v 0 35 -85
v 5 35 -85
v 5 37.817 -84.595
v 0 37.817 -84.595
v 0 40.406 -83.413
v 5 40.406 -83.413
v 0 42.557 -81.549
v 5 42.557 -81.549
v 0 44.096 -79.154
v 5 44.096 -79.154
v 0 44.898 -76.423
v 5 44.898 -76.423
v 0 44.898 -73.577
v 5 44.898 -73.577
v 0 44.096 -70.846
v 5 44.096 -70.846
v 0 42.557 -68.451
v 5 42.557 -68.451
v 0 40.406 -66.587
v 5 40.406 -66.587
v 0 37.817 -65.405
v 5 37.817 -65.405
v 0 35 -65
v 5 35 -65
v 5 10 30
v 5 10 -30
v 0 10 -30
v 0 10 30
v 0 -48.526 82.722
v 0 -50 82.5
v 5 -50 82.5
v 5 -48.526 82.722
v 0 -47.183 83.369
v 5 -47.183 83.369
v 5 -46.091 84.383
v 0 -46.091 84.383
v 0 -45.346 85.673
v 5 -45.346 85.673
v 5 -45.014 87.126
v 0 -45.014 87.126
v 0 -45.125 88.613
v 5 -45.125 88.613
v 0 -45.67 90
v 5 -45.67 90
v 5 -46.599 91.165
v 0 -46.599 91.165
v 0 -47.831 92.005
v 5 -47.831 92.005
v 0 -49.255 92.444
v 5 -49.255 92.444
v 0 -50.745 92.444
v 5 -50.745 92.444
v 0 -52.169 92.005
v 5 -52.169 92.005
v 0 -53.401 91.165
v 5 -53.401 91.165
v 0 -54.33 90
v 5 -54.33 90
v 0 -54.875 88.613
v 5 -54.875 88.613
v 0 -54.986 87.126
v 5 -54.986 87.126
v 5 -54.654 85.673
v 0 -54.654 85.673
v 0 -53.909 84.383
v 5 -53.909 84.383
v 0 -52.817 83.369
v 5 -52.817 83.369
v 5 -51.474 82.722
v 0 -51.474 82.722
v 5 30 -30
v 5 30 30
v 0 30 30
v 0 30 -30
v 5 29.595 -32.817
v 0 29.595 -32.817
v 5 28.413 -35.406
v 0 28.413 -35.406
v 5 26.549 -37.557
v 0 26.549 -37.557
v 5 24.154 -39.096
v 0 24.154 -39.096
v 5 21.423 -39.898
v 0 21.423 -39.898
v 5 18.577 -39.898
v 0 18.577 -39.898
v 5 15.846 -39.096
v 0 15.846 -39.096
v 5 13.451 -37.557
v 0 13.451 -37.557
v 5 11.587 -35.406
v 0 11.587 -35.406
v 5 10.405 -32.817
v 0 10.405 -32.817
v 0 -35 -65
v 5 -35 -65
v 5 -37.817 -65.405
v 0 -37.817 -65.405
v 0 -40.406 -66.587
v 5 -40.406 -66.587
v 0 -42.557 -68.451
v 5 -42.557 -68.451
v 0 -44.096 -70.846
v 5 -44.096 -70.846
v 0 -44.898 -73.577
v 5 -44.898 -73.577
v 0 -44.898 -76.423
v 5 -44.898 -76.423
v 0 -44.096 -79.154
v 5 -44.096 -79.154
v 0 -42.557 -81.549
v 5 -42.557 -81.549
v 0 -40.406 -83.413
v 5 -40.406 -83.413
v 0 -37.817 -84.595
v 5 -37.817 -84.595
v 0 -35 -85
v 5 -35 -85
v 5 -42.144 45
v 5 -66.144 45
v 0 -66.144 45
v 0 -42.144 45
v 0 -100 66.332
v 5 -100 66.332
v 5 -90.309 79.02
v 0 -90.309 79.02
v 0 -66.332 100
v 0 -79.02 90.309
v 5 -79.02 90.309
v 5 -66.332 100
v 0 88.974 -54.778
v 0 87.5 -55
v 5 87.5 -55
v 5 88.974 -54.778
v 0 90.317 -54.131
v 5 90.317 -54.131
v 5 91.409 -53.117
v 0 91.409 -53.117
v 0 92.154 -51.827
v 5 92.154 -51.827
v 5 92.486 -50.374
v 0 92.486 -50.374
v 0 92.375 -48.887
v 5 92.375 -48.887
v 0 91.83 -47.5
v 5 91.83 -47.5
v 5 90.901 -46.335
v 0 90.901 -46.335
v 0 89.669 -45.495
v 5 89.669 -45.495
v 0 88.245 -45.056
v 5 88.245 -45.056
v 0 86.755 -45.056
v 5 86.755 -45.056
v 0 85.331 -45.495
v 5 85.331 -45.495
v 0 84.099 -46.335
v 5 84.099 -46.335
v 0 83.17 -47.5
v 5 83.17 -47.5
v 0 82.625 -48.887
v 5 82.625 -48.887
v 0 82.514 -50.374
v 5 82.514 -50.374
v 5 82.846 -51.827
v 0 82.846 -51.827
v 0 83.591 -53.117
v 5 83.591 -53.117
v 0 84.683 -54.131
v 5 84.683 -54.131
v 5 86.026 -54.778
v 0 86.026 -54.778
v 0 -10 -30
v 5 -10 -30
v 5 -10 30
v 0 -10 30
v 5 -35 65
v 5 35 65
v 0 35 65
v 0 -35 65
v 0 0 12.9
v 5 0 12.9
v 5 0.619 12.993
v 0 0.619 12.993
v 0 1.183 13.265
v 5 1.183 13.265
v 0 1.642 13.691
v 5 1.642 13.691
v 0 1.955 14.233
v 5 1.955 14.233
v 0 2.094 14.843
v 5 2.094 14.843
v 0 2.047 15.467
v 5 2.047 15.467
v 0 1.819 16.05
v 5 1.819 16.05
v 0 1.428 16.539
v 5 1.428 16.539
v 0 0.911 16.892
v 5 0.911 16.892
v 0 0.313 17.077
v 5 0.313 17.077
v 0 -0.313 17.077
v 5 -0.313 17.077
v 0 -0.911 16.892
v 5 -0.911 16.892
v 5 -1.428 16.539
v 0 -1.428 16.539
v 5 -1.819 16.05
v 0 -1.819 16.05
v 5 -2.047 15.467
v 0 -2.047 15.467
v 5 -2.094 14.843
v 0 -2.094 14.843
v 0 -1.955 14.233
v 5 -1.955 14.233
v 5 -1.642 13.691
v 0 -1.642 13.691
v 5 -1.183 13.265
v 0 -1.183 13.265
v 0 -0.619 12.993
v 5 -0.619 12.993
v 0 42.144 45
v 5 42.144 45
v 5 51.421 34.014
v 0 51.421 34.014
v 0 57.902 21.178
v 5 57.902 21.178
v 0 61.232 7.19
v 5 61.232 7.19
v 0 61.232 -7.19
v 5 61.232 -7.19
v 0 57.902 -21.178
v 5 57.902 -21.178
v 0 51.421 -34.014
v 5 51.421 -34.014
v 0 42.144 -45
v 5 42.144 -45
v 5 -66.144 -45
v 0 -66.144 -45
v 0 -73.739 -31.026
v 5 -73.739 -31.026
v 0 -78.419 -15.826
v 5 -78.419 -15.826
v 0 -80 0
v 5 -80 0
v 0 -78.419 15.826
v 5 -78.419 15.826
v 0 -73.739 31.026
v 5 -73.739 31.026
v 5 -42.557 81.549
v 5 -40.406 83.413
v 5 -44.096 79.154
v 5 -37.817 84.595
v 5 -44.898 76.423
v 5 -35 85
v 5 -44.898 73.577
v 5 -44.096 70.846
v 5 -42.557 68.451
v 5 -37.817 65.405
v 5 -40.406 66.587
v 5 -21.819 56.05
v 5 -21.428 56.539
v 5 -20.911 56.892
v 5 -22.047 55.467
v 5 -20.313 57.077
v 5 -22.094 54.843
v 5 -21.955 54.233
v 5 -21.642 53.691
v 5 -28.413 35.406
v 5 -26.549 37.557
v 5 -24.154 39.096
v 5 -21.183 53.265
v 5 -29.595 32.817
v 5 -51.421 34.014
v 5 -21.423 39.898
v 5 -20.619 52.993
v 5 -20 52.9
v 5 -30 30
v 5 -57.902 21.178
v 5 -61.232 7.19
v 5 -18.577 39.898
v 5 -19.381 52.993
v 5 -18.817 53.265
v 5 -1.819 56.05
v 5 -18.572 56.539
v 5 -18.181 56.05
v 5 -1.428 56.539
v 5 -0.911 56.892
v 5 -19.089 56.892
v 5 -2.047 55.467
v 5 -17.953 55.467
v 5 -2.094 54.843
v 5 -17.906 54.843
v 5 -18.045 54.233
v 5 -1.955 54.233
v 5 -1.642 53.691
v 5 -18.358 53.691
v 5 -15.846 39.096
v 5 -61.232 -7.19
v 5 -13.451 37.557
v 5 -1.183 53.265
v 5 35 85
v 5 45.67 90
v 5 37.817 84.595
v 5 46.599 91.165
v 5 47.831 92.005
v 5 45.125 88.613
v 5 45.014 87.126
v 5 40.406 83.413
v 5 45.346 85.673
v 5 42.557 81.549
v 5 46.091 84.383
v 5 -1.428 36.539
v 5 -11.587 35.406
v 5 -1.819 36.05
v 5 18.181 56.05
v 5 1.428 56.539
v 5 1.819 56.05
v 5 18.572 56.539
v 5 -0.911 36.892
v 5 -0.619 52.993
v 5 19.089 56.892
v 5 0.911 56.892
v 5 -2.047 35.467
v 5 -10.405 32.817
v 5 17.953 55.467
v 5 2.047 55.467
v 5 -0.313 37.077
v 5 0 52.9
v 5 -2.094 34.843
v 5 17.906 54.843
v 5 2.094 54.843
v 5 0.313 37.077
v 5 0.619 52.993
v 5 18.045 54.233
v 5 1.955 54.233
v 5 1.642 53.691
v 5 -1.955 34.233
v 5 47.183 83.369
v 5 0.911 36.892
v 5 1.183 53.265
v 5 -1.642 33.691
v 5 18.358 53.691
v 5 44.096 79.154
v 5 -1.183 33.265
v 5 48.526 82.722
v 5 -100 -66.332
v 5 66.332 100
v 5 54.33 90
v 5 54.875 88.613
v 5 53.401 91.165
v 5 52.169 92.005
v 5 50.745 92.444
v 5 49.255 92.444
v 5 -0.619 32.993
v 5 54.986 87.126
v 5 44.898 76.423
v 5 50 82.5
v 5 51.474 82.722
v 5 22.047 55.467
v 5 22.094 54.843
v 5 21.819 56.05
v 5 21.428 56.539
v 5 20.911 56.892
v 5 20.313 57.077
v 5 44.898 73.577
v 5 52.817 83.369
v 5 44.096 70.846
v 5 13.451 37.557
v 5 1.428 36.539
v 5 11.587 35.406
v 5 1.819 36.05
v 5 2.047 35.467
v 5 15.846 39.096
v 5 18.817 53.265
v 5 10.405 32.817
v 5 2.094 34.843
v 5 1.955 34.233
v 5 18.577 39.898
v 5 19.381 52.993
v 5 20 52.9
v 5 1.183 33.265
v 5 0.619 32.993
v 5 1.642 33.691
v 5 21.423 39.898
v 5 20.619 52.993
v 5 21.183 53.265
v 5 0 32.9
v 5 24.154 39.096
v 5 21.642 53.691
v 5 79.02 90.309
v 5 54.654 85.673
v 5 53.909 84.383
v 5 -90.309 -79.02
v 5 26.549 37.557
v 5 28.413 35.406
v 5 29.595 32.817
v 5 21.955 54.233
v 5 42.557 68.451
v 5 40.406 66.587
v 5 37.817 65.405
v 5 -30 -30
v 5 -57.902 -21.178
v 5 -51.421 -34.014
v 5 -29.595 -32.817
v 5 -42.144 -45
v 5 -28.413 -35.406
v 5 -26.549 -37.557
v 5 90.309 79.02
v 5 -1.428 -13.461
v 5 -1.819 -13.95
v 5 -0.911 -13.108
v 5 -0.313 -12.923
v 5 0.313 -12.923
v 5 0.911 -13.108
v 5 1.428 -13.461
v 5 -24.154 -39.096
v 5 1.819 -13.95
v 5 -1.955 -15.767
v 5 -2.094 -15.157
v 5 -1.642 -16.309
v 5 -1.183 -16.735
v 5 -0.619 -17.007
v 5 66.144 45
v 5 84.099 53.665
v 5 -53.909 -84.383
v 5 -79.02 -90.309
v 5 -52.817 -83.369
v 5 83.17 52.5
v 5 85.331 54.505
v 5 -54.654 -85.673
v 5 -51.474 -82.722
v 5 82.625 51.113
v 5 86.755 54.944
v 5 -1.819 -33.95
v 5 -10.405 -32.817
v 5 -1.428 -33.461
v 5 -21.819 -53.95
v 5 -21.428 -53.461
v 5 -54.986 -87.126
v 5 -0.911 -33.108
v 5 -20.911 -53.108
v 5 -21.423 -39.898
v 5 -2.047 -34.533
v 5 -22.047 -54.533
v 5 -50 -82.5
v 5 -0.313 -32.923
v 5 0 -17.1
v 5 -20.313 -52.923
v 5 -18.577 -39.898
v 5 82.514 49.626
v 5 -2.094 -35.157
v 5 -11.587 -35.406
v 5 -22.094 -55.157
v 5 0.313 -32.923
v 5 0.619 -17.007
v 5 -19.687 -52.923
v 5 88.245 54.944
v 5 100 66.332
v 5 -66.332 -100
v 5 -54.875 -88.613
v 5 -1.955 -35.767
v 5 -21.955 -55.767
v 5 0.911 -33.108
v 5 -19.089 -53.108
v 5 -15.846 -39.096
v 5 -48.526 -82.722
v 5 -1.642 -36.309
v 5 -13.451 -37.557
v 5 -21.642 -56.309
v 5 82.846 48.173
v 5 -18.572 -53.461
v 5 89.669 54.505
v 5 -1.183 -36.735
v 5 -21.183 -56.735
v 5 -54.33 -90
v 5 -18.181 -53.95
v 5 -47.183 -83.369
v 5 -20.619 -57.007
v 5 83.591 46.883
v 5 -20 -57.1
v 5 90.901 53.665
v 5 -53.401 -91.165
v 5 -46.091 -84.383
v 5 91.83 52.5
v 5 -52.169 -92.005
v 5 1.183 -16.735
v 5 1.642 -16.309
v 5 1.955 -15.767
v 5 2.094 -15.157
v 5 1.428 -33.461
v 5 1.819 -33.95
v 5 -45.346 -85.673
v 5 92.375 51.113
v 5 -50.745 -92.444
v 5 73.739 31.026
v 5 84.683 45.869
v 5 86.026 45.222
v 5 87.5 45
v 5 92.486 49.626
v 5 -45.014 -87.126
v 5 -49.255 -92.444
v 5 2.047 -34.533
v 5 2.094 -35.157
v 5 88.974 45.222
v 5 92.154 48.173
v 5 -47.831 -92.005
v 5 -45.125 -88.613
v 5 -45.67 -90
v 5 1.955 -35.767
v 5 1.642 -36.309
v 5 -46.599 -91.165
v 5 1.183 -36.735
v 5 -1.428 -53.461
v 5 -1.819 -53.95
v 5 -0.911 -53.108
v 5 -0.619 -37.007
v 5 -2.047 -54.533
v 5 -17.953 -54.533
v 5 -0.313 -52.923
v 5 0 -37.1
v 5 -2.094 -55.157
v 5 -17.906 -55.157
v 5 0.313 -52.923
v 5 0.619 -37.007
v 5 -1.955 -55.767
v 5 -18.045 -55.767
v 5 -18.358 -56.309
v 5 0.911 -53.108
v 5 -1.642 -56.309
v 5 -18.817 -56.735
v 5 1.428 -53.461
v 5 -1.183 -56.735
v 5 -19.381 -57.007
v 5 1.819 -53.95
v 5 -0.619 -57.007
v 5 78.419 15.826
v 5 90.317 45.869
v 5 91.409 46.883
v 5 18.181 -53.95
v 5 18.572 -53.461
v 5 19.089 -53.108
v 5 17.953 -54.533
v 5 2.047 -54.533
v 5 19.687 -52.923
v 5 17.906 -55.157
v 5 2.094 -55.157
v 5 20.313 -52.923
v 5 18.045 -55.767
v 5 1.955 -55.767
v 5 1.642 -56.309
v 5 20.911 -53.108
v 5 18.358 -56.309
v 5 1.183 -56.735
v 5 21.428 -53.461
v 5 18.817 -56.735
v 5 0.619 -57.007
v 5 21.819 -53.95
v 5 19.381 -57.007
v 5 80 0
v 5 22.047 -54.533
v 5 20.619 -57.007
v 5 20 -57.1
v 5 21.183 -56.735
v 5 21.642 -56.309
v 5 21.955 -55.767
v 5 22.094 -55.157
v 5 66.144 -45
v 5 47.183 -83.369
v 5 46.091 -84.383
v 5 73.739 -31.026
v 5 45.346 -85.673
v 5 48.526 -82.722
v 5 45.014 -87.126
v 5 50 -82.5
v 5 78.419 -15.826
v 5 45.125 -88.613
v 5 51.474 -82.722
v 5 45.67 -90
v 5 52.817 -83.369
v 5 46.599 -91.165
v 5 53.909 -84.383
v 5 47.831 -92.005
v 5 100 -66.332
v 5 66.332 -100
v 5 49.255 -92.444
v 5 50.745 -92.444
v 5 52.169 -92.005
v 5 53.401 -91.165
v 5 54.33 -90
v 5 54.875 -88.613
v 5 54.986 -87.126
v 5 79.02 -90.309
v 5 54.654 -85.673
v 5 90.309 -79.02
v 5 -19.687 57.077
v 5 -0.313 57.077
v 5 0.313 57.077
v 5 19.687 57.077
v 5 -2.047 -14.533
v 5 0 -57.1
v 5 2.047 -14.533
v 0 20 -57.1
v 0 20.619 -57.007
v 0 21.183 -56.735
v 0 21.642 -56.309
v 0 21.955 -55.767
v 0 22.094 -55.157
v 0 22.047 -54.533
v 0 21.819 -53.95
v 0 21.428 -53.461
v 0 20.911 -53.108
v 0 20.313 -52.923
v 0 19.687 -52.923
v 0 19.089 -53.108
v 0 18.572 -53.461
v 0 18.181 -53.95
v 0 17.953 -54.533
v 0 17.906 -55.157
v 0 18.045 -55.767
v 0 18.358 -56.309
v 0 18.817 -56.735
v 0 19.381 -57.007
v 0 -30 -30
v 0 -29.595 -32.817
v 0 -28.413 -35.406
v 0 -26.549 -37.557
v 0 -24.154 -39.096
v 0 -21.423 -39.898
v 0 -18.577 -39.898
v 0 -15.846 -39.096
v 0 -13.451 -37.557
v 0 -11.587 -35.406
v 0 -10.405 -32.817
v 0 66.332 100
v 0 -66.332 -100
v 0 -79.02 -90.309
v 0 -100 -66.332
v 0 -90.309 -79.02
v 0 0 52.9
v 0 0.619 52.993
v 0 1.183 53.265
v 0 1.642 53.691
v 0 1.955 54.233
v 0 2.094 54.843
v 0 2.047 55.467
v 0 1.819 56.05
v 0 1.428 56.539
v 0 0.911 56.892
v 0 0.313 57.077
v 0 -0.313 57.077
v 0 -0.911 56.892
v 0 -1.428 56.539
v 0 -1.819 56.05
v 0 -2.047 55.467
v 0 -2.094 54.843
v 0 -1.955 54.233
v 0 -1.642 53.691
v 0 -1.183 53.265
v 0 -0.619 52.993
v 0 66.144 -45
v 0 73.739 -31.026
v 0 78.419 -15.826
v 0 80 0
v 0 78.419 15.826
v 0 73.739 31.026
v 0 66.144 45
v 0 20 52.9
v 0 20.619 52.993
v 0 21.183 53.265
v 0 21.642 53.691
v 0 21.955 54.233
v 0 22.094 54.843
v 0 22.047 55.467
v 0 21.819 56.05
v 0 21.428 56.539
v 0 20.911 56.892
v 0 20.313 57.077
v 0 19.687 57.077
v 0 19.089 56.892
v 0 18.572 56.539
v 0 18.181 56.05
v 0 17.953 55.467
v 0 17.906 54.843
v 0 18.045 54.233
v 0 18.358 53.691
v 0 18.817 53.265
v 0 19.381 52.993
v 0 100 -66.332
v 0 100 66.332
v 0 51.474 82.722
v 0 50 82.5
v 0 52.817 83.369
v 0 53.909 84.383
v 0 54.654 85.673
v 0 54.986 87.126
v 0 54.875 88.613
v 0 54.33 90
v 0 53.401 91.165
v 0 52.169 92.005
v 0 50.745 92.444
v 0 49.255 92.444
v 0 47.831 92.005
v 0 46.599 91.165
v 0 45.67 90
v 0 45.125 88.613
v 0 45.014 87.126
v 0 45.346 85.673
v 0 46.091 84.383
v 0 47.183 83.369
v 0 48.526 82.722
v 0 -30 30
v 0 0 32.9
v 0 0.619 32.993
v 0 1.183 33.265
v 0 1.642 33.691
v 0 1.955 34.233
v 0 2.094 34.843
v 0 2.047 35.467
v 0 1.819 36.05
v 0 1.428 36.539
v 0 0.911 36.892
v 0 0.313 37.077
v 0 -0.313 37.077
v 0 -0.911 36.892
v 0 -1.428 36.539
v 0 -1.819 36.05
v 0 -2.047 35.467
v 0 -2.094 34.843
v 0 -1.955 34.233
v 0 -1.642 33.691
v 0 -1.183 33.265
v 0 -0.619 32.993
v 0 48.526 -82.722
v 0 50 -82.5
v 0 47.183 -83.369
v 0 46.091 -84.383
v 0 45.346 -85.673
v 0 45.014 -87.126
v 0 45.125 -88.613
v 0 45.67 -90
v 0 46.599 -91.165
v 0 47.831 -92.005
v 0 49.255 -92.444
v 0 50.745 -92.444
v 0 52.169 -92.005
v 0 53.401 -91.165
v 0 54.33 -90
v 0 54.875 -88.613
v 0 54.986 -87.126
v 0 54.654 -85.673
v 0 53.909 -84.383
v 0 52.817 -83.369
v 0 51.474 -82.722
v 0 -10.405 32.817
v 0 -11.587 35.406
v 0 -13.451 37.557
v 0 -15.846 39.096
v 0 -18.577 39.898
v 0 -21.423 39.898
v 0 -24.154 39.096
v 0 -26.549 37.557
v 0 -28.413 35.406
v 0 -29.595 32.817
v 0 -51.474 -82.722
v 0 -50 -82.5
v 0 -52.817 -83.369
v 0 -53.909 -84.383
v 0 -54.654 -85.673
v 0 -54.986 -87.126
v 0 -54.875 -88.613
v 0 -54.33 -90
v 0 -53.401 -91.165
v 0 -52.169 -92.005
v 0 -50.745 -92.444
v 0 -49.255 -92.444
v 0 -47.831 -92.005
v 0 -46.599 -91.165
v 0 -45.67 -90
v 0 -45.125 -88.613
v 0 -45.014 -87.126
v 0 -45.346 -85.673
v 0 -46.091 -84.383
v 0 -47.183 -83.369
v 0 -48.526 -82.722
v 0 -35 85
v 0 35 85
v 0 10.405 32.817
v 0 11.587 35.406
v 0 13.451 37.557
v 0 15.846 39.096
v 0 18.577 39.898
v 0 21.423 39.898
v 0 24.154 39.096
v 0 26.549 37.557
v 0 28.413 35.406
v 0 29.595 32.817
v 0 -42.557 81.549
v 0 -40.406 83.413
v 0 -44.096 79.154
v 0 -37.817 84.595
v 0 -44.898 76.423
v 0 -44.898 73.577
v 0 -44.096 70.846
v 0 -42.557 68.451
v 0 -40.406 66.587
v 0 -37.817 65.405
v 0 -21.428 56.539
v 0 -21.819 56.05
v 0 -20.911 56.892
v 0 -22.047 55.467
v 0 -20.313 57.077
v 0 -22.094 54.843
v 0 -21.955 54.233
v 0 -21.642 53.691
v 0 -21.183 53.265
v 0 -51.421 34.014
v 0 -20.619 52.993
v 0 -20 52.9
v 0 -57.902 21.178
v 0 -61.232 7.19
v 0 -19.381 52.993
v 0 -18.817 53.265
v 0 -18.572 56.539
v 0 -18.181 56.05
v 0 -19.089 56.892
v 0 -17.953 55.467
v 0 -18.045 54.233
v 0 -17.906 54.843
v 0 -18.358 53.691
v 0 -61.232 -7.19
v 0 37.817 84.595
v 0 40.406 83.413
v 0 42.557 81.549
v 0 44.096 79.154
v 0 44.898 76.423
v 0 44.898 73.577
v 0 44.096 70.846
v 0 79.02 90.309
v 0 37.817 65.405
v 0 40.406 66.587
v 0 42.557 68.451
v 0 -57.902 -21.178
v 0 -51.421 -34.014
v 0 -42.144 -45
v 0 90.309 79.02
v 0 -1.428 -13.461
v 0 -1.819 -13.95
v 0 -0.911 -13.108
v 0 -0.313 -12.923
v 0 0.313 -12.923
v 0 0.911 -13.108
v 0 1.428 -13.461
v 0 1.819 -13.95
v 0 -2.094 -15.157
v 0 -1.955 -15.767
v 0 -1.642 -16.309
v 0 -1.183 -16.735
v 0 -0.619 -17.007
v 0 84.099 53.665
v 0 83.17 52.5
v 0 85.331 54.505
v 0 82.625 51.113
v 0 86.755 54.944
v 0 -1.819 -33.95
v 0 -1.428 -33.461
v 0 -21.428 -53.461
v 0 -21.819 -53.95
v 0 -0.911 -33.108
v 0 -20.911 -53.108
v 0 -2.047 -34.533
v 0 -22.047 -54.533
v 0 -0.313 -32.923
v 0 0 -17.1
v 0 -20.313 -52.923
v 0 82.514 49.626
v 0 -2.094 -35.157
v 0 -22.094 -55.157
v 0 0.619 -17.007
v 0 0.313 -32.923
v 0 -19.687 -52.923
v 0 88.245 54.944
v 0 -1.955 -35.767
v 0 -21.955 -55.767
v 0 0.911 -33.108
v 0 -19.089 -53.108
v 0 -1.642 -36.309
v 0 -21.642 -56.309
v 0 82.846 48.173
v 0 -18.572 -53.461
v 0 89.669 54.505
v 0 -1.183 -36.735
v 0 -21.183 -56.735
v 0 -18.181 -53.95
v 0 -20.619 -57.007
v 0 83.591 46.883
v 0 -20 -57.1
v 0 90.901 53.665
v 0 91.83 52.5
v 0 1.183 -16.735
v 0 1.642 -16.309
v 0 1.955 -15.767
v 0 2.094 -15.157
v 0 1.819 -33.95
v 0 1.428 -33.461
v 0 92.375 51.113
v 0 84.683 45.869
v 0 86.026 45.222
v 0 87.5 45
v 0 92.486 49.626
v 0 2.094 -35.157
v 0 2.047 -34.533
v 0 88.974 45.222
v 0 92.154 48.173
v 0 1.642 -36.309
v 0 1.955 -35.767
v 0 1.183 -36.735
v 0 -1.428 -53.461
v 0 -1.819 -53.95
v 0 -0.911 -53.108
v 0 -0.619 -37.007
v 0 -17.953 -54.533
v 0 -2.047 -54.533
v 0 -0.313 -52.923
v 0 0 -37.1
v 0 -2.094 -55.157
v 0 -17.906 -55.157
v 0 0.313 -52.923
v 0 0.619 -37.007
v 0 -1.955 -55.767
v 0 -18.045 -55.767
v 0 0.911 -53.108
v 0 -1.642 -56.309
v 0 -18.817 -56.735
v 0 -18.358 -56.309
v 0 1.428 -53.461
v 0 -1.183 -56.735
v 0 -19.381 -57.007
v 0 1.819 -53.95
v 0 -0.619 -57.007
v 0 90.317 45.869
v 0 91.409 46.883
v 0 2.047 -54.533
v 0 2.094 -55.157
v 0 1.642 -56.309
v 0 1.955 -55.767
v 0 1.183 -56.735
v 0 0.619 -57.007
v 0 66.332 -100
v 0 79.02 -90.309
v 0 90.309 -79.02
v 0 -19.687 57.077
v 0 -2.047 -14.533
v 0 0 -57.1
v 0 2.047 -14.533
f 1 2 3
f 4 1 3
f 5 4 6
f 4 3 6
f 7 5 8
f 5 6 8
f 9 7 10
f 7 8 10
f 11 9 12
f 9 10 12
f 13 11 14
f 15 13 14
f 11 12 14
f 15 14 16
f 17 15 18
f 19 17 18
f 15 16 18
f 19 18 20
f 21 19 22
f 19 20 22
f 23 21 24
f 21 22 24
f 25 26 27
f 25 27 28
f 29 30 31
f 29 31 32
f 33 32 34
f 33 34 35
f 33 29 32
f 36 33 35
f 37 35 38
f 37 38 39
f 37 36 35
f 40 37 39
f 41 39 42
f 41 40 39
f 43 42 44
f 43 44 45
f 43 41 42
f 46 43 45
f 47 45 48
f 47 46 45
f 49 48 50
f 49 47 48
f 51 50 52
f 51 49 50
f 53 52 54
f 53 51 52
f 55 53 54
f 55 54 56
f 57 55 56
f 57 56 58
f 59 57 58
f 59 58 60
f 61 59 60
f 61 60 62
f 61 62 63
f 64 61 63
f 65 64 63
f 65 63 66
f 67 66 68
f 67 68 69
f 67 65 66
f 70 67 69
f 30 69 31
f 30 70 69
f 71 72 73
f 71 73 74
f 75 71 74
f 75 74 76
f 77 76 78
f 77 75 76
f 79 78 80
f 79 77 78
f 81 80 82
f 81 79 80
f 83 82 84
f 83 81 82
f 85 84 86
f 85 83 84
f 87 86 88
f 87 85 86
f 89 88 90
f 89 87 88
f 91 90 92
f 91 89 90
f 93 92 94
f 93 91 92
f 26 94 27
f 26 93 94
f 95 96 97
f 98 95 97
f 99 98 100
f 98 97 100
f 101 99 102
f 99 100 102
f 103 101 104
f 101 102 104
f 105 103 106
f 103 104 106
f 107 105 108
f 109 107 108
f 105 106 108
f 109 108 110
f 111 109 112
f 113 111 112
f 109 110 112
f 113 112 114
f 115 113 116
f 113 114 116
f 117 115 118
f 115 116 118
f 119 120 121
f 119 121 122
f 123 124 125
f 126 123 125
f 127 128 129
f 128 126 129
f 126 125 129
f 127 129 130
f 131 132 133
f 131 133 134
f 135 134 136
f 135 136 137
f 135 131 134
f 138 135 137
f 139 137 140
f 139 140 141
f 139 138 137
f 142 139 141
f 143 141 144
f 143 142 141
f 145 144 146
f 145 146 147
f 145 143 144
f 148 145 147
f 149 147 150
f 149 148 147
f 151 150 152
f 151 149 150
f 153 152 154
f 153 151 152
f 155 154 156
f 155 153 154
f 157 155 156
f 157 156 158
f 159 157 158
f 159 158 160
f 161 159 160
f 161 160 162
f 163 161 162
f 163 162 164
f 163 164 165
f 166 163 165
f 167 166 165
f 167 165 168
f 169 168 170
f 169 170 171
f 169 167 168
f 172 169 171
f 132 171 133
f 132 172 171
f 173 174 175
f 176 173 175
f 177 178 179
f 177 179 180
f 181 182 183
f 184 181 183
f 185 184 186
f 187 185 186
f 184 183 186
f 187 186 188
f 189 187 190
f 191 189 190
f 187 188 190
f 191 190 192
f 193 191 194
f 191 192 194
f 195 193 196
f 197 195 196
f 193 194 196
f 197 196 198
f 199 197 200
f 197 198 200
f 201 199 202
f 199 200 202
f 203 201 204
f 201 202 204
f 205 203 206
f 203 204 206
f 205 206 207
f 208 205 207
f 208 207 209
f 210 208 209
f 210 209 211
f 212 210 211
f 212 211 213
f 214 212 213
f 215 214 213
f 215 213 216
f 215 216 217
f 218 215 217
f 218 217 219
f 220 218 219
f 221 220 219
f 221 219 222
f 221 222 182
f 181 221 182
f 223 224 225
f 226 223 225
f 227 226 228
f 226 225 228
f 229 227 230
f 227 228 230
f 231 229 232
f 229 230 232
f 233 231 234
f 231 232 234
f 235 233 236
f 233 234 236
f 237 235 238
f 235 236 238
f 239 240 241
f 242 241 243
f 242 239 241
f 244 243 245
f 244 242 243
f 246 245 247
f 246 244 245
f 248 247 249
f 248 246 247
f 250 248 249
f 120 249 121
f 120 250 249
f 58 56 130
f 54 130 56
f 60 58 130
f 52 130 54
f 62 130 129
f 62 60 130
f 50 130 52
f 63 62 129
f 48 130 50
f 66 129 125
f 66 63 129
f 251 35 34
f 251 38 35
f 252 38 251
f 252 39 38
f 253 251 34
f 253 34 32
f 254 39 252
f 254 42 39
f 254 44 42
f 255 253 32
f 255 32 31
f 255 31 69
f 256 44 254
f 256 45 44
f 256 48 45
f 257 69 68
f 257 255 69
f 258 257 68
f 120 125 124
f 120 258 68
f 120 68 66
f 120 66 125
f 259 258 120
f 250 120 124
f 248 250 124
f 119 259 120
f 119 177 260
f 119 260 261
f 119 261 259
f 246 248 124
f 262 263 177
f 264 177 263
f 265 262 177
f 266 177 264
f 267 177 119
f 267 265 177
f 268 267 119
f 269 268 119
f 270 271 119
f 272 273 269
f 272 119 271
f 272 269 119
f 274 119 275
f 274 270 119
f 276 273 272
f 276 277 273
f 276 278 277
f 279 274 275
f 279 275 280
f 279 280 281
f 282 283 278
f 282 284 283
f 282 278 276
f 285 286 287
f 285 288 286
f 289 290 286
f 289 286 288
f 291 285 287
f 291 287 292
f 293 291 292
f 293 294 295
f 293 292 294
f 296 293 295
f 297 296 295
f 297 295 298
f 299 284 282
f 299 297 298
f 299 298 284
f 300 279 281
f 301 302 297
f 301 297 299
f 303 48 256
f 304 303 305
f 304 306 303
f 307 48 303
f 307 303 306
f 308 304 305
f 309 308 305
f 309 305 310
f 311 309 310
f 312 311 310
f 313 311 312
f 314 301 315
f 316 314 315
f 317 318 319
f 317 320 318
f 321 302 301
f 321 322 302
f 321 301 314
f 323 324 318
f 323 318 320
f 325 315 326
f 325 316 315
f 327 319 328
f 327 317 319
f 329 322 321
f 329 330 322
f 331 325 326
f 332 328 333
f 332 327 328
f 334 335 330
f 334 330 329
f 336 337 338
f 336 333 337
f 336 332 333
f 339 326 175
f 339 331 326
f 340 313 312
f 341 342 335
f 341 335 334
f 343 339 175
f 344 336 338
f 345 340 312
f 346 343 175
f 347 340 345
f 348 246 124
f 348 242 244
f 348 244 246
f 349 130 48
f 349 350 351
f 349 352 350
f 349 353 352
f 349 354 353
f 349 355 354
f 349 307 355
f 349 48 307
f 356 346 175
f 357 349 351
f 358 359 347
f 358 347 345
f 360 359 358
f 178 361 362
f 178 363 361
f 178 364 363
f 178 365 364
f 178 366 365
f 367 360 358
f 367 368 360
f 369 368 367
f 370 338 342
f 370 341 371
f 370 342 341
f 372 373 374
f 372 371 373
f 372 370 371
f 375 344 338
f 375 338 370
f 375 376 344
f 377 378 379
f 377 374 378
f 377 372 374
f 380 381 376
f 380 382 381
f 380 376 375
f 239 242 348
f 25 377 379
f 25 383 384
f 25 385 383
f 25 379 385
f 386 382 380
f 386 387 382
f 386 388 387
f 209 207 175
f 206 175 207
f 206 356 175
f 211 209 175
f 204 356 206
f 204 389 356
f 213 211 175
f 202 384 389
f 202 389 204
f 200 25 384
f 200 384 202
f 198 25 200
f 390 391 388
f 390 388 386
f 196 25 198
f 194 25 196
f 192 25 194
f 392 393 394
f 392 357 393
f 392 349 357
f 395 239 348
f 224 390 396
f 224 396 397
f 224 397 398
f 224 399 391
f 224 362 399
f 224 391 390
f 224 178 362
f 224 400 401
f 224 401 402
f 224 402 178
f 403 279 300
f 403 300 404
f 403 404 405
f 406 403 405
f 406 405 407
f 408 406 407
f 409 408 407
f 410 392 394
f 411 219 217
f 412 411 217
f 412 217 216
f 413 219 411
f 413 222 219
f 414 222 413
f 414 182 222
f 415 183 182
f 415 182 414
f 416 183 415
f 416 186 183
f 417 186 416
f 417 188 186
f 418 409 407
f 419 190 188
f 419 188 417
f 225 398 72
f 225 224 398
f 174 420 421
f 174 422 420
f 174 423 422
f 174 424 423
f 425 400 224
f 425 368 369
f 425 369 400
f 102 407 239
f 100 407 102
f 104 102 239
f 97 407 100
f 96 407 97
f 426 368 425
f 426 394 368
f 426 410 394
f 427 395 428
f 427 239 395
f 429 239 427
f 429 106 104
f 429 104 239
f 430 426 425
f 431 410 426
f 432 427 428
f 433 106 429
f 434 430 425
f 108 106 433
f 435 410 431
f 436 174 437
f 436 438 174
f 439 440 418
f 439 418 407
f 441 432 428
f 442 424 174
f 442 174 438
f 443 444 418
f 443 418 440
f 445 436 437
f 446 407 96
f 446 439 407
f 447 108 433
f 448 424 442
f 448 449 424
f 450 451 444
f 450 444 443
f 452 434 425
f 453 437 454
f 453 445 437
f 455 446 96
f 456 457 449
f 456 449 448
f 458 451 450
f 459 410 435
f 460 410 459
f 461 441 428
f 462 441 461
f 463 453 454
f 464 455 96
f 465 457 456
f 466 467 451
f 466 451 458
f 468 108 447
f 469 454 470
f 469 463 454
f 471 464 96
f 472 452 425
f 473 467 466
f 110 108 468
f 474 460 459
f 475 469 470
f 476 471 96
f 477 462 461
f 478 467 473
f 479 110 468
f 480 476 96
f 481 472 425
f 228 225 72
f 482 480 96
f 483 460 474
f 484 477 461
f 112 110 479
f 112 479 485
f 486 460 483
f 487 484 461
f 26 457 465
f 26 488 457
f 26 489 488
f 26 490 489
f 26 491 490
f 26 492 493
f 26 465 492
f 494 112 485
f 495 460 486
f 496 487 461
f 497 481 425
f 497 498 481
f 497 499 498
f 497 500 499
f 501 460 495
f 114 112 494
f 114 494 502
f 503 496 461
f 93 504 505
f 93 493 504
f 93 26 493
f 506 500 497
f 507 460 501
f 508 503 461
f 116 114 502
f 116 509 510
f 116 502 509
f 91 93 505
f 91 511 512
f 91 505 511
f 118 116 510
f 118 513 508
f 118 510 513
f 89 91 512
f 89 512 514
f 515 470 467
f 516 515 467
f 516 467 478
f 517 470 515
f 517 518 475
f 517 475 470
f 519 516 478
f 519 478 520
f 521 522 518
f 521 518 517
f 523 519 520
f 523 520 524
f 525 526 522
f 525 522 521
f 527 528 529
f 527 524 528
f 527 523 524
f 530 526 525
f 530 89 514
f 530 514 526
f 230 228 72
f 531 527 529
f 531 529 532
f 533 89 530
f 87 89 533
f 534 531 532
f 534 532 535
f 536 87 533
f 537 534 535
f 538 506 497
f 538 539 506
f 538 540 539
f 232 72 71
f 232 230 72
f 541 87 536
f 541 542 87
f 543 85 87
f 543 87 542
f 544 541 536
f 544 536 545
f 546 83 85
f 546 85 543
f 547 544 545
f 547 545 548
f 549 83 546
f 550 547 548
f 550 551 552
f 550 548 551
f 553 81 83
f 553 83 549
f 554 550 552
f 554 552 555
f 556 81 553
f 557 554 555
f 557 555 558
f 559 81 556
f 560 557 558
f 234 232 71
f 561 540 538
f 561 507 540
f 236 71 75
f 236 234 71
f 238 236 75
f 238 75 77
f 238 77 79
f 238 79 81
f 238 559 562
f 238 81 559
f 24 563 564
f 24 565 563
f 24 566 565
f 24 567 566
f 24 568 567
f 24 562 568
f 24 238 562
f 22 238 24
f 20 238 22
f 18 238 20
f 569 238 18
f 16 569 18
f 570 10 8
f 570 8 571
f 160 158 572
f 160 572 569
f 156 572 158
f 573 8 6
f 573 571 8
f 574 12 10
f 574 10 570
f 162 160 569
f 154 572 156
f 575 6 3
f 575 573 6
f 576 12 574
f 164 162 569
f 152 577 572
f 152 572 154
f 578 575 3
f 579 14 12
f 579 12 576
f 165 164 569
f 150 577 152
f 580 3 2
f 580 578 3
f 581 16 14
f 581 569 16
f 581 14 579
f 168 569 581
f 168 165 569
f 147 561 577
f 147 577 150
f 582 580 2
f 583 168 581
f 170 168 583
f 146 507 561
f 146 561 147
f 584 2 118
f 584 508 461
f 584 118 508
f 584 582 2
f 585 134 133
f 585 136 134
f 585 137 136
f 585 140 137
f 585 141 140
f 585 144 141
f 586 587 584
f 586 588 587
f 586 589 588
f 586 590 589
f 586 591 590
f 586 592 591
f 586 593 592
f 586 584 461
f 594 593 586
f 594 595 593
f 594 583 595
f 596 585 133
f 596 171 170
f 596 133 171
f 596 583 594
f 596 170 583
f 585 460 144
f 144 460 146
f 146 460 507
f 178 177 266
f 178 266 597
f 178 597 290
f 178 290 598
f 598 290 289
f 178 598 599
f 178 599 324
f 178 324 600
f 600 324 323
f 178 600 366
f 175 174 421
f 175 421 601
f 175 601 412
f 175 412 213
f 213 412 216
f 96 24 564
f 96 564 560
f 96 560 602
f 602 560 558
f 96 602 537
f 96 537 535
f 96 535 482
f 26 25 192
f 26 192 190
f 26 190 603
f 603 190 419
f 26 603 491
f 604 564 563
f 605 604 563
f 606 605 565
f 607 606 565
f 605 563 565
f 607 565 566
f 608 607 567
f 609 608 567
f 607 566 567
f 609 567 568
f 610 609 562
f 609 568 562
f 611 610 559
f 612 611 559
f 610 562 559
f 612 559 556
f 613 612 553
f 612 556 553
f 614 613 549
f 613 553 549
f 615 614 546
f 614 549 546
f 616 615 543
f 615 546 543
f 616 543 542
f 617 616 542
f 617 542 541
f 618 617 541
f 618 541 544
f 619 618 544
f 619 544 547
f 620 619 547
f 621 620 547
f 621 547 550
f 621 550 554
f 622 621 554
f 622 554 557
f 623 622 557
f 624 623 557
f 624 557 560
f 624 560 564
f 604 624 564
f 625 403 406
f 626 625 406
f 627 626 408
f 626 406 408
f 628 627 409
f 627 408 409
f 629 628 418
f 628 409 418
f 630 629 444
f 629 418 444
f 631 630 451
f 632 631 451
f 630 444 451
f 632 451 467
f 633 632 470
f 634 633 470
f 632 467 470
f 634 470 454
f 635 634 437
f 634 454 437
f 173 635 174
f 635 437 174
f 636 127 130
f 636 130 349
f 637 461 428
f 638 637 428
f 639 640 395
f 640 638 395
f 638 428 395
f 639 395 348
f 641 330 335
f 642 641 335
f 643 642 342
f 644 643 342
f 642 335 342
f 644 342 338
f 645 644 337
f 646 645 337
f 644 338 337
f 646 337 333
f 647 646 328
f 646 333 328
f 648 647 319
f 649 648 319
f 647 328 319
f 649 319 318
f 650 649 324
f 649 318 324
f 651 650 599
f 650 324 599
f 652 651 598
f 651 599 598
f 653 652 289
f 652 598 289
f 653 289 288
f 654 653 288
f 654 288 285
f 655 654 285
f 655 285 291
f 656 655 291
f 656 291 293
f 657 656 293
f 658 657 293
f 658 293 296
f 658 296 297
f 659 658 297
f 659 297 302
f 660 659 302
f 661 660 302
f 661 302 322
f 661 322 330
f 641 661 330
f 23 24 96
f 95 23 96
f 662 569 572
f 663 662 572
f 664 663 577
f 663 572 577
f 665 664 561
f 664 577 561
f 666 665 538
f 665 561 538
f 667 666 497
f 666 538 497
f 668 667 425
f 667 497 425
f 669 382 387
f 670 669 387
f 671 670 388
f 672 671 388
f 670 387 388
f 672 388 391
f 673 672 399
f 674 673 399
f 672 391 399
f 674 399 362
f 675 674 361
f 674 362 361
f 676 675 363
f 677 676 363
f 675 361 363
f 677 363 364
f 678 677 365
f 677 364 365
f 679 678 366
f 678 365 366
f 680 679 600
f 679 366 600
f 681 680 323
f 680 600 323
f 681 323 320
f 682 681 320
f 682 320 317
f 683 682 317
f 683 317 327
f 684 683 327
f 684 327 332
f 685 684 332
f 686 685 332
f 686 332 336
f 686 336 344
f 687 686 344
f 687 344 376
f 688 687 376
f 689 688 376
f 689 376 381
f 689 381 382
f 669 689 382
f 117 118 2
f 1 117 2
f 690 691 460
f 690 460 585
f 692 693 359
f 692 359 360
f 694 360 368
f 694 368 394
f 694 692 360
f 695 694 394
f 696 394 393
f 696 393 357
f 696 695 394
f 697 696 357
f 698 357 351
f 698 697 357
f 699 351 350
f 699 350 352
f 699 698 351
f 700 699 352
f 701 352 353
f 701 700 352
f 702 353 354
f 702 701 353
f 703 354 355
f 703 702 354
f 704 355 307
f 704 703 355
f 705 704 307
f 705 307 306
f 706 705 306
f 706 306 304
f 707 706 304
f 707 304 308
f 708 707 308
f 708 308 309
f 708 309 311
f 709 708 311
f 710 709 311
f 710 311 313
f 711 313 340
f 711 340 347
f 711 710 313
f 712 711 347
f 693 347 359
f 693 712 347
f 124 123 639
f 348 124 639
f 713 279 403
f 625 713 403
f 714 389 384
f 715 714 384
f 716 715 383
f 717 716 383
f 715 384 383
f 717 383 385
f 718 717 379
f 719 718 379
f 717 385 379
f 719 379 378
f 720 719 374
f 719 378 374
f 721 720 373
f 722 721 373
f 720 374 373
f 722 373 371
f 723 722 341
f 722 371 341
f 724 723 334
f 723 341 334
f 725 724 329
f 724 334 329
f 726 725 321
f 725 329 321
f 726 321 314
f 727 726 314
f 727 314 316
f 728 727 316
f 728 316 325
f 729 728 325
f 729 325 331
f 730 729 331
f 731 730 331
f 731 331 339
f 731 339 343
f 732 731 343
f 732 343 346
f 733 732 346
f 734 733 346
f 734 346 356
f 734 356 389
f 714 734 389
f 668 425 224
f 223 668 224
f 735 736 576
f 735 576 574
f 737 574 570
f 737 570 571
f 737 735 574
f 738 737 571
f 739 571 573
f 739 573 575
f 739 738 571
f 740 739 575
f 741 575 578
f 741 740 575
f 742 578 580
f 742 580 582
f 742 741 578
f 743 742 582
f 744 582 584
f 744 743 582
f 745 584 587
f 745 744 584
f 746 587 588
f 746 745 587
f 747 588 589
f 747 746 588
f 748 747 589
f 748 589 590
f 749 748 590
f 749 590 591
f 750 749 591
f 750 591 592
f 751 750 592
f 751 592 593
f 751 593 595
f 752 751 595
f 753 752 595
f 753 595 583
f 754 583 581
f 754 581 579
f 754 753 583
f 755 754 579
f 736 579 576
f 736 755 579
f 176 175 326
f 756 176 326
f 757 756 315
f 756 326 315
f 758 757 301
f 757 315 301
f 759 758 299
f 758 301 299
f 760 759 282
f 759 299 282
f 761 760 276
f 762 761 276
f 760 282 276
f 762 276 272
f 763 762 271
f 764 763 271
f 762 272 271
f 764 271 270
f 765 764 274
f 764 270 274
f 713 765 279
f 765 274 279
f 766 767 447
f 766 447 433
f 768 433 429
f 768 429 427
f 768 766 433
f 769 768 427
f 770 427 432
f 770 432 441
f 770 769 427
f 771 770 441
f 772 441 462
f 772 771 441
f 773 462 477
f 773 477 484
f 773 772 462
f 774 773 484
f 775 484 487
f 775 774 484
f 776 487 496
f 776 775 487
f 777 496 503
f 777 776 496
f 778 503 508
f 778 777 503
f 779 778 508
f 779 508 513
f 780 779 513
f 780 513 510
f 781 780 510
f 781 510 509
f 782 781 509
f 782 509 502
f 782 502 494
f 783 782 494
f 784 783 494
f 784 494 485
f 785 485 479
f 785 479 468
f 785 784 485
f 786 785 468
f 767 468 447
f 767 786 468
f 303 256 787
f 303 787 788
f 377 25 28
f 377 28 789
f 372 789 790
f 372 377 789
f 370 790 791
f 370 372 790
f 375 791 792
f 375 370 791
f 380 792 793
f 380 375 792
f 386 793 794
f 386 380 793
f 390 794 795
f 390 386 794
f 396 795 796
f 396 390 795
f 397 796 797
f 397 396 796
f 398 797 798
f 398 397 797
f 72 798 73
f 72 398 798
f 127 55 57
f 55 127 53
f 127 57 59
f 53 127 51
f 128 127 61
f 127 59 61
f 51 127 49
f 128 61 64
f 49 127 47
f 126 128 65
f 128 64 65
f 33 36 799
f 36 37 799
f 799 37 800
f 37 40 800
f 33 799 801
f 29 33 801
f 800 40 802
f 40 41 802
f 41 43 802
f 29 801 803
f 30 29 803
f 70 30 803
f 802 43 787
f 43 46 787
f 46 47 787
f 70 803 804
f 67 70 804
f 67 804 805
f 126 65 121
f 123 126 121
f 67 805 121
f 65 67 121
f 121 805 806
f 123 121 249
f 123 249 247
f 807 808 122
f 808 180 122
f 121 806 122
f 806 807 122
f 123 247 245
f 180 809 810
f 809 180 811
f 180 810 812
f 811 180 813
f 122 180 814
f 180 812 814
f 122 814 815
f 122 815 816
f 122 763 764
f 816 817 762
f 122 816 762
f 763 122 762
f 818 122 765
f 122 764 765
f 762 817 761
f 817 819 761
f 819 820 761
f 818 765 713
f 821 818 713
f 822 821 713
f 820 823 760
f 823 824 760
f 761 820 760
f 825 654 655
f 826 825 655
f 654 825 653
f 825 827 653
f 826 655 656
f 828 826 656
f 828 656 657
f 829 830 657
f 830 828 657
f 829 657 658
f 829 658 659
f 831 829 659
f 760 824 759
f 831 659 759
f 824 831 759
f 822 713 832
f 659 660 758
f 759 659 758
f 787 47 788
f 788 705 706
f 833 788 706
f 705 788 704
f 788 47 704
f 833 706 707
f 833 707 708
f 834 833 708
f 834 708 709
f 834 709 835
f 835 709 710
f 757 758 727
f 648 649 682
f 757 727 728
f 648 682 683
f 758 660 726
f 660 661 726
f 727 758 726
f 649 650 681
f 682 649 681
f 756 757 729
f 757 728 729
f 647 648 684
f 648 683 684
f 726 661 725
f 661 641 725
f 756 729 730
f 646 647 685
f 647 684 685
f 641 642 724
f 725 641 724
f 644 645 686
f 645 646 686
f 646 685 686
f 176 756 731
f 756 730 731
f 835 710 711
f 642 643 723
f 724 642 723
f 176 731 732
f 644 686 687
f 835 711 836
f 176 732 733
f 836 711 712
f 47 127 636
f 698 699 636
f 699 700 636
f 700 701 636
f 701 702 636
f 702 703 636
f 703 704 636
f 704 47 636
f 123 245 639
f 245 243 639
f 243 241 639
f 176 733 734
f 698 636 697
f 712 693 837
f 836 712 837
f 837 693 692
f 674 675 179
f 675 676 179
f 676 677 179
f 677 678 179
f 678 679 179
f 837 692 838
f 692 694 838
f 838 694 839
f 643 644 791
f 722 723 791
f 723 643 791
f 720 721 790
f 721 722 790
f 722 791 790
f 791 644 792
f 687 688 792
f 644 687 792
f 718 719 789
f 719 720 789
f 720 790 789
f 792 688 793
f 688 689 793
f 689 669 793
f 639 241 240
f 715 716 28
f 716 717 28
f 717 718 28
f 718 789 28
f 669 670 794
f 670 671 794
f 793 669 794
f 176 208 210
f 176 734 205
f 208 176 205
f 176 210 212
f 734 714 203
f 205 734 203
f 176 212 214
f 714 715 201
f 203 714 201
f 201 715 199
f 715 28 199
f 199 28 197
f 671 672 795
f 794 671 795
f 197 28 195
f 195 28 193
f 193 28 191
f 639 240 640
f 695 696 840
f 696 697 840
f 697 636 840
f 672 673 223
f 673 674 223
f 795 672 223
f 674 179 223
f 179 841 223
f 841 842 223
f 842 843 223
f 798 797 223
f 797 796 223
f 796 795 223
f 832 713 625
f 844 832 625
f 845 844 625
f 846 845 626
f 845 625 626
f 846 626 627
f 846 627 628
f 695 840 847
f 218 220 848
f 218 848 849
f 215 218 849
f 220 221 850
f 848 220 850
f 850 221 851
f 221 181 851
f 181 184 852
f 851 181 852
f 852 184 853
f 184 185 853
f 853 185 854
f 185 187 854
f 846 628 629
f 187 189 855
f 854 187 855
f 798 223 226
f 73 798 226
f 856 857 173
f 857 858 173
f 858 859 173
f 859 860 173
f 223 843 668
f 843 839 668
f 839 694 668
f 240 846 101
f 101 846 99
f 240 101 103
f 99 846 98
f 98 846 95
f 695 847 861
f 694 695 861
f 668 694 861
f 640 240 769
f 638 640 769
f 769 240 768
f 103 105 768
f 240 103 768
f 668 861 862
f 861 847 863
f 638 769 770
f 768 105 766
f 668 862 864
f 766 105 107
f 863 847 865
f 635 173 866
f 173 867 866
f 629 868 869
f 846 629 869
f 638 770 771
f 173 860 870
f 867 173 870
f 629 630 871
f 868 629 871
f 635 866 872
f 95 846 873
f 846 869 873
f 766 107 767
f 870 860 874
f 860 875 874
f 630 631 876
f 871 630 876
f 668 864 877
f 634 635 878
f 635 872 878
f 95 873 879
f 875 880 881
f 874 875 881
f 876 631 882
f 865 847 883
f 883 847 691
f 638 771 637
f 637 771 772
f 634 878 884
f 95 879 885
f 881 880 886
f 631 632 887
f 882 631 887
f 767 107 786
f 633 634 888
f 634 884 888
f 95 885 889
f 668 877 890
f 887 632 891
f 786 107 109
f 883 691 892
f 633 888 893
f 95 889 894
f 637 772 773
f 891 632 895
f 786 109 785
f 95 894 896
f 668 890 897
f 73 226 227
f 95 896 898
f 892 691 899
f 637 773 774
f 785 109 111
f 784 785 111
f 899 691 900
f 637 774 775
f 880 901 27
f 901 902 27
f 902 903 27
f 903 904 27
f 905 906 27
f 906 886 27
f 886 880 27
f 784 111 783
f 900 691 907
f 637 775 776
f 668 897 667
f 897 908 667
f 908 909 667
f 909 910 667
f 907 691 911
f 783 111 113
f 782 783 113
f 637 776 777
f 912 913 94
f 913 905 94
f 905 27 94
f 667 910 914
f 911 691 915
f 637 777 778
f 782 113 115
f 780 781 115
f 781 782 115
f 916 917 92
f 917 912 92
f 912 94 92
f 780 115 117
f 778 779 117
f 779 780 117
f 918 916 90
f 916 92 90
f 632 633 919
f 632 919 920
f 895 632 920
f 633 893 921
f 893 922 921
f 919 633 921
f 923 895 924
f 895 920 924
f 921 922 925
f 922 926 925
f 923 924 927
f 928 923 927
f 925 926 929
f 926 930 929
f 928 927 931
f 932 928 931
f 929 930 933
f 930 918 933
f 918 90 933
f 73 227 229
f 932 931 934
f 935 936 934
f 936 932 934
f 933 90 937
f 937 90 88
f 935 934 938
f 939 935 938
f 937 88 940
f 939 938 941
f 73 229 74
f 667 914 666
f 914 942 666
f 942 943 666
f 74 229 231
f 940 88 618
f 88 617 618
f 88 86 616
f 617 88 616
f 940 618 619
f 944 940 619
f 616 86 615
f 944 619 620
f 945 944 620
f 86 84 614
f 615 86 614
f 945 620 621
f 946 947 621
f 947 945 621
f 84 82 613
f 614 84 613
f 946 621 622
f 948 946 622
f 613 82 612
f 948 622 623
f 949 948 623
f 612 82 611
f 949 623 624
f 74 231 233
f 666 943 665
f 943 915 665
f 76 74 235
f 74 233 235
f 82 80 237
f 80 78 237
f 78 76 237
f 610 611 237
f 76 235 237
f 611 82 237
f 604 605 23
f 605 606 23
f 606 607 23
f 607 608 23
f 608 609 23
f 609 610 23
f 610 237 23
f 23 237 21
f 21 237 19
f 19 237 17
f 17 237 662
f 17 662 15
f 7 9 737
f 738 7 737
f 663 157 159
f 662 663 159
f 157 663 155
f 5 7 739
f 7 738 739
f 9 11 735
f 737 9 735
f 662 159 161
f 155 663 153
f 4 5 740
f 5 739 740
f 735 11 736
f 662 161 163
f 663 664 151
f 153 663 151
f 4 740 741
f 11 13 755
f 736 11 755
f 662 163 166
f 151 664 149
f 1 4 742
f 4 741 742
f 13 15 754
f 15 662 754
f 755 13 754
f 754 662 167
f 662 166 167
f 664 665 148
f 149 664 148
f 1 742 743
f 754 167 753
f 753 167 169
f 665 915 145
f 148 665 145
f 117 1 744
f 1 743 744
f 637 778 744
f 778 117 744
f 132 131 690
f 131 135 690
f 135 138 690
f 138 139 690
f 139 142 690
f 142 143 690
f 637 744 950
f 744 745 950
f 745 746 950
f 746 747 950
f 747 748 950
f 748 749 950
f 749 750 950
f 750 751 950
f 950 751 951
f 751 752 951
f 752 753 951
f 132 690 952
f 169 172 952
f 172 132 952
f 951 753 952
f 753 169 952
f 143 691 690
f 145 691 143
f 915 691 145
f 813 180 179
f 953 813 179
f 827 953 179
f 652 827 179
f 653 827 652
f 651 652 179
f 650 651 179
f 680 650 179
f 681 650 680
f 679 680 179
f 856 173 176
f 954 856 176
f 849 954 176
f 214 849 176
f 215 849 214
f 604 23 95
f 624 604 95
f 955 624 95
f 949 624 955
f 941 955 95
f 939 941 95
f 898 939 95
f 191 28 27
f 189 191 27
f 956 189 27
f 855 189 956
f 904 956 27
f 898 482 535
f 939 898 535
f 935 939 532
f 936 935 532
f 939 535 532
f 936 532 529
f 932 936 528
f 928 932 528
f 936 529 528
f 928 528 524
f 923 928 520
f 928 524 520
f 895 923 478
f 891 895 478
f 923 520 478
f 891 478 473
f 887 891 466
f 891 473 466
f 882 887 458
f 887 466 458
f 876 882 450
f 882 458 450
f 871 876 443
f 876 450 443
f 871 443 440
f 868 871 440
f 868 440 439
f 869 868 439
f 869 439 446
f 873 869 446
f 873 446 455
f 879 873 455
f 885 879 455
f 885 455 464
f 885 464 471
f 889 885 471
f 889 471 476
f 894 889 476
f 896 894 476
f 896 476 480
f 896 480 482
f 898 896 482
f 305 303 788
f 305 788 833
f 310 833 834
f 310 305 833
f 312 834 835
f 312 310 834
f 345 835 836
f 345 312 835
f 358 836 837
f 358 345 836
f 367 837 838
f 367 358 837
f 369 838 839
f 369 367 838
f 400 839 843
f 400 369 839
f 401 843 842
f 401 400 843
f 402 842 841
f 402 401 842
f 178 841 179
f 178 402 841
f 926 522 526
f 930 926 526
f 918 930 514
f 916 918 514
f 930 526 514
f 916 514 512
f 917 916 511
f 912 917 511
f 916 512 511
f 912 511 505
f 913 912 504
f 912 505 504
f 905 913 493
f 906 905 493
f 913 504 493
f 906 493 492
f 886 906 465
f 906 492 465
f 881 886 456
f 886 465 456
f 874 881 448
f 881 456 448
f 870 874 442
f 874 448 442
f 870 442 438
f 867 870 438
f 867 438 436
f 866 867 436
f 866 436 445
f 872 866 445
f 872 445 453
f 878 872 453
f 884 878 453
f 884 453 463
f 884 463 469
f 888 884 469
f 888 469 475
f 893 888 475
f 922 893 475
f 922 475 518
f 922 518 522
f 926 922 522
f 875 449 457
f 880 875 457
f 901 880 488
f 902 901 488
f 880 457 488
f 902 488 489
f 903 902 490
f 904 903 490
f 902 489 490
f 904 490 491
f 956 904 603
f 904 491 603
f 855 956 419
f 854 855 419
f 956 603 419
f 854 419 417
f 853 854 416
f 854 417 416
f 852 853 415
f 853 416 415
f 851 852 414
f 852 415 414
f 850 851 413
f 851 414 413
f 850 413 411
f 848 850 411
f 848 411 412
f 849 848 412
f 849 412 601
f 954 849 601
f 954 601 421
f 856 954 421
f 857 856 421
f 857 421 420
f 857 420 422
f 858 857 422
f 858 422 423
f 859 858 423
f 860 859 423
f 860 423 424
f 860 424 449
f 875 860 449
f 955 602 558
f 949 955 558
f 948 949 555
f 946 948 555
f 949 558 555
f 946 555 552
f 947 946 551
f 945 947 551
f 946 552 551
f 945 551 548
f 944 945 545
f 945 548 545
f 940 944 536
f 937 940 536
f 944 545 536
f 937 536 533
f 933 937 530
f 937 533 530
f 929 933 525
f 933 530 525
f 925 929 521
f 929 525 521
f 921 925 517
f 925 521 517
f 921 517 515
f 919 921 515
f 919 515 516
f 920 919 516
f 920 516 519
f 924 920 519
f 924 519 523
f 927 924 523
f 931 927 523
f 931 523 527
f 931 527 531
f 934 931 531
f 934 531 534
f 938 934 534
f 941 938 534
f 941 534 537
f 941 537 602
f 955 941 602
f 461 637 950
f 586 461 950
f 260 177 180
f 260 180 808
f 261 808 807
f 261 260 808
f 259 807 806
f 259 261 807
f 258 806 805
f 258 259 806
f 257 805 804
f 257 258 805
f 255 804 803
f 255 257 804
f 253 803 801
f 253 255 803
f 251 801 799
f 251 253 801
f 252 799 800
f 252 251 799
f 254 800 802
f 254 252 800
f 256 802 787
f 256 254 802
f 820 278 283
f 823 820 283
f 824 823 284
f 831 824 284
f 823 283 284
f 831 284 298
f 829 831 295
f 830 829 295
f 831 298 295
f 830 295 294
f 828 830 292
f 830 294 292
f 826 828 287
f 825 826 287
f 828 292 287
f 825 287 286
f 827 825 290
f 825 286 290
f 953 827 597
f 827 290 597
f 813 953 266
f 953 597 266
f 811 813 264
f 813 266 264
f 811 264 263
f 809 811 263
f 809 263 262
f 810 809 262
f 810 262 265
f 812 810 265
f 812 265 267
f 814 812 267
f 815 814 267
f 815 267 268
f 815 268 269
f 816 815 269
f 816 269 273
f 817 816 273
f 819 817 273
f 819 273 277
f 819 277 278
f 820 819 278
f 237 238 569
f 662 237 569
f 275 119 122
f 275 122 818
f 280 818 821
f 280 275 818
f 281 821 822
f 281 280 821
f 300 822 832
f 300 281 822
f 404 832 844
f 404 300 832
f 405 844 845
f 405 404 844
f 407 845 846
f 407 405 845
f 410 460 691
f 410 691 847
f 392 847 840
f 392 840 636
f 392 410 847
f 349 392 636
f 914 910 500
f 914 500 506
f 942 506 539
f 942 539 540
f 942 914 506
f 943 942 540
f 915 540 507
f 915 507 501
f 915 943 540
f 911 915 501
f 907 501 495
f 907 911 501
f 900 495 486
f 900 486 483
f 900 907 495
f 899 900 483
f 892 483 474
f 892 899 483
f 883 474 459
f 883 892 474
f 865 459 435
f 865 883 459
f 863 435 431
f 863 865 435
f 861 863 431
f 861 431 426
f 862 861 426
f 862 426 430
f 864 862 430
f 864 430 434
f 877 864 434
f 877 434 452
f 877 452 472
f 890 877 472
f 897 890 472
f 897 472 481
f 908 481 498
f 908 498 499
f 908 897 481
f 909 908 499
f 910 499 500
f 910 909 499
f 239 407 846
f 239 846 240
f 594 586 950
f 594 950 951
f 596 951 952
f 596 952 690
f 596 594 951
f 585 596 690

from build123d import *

# Parameters (mm, degrees)
SKETCH_1_W          = 200
SKETCH_1_H          = 200
SKETCH_1_R          = 5
EXTRUDE_1_DEPTH     = 5
SKETCH_3_R          = 2.1
CUT_EXTRUDE_2_DEPTH = 142.509716981


with BuildPart() as part:
    # 草图1 → 凸台-拉伸1 (new body)
    with BuildSketch(Plane(origin=(0, 0, 0), x_dir=(0, 0, -1), z_dir=(1, 0, 0))):
        Rectangle(SKETCH_1_W, SKETCH_1_H)
        with Locations((-50, 87.5)):
            Circle(SKETCH_1_R, mode=Mode.SUBTRACT)
        with Locations((50, 87.5)):
            Circle(SKETCH_1_R, mode=Mode.SUBTRACT)
        with Locations((-87.5, 50)):
            Circle(SKETCH_1_R, mode=Mode.SUBTRACT)
        with Locations((-87.5, -50)):
            Circle(SKETCH_1_R, mode=Mode.SUBTRACT)
        with Locations(Location((87.5, -50, 0), (0, 0, 180))):
            Circle(SKETCH_1_R, mode=Mode.SUBTRACT)
        with Locations(Location((87.5, 50, 0), (0, 0, 180))):
            Circle(SKETCH_1_R, mode=Mode.SUBTRACT)
    extrude(amount=EXTRUDE_1_DEPTH)

    # 草图3 → 切除-拉伸2 (cut, through all)
    with BuildSketch(Plane(origin=(5, 0, 0), x_dir=(0, 0, -1), z_dir=(1, 0, 0))):
        with Locations((-55, 20)):
            Circle(SKETCH_3_R)
        with Locations((-55, 0)):
            Circle(SKETCH_3_R)
        with Locations((-55, -20)):
            Circle(SKETCH_3_R)
        with Locations((55, 0)):
            Circle(SKETCH_3_R)
        with Locations((55, 20)):
            Circle(SKETCH_3_R)
        with Locations((55, -20)):
            Circle(SKETCH_3_R)
        with Locations((-35, 0)):
            Circle(SKETCH_3_R)
        with Locations((-15, 0)):
            Circle(SKETCH_3_R)
        with Locations((35, 0)):
            Circle(SKETCH_3_R)
        with Locations((15, 0)):
            Circle(SKETCH_3_R)
        with BuildLine():
            Line((-45, 66.143782777), (-45, 42.143782777))
            ThreePointArc((-45, 42.143782777), (0, 61.653048803), (45, 42.143782777))
            Line((45, 42.143782777), (45, 66.143782777))
            ThreePointArc((45, 66.143782777), (0, 80), (-45, 66.143782777))
        make_face()
        with BuildLine():
            Line((-45, -66.143782777), (-45, -42.143782777))
            ThreePointArc((-45, -42.143782777), (0, -61.653048803), (45, -42.143782777))
            Line((45, -42.143782777), (45, -66.143782777))
            ThreePointArc((45, -66.143782777), (0, -80), (-45, -66.143782777))
        make_face()
        with BuildLine():
            Line((-100, -66.332495807), (-100, -100))
            Line((-100, -100), (-66.332495807, -100))
            ThreePointArc((-66.332495807, -100), (-84.852813742, -84.852813742), (-100, -66.332495807))
        make_face()
        with BuildLine():
            Line((66.332495807, -100), (100, -100))
            Line((100, -100), (100, -66.332495807))
            ThreePointArc((100, -66.332495807), (84.852813742, -84.852813742), (66.332495807, -100))
        make_face()
        with BuildLine():
            Line((66.332495807, 100), (100, 100))
            Line((100, 100), (100, 66.332495807))
            ThreePointArc((100, 66.332495807), (84.852813742, 84.852813742), (66.332495807, 100))
        make_face()
        with BuildLine():
            Line((-100, 66.332495807), (-100, 100))
            Line((-100, 100), (-66.332495807, 100))
            ThreePointArc((-66.332495807, 100), (-84.852813742, 84.852813742), (-100, 66.332495807))
        make_face()
        with BuildLine():
            Line((-65, 35), (-65, -35))
            ThreePointArc((-65, -35), (-75, -45), (-85, -35))
            Line((-85, -35), (-85, 35))
            ThreePointArc((-85, 35), (-75, 45), (-65, 35))
        make_face()
        with BuildLine():
            Line((65, 35), (65, -35))
            ThreePointArc((65, -35), (75, -45), (85, -35))
            Line((85, -35), (85, 35))
            ThreePointArc((85, 35), (75, 45), (65, 35))
        make_face()
        with BuildLine():
            Line((-30, 30), (30, 30))
            ThreePointArc((30, 30), (40, 20), (30, 10))
            Line((30, 10), (-30, 10))
            ThreePointArc((-30, 10), (-40, 20), (-30, 30))
        make_face()
        with BuildLine():
            Line((-30, -30), (30, -30))
            ThreePointArc((30, -30), (40, -20), (30, -10))
            Line((30, -10), (-30, -10))
            ThreePointArc((-30, -10), (-40, -20), (-30, -30))
        make_face()
    extrude(amount=-CUT_EXTRUDE_2_DEPTH, mode=Mode.SUBTRACT)


solid = part.part
